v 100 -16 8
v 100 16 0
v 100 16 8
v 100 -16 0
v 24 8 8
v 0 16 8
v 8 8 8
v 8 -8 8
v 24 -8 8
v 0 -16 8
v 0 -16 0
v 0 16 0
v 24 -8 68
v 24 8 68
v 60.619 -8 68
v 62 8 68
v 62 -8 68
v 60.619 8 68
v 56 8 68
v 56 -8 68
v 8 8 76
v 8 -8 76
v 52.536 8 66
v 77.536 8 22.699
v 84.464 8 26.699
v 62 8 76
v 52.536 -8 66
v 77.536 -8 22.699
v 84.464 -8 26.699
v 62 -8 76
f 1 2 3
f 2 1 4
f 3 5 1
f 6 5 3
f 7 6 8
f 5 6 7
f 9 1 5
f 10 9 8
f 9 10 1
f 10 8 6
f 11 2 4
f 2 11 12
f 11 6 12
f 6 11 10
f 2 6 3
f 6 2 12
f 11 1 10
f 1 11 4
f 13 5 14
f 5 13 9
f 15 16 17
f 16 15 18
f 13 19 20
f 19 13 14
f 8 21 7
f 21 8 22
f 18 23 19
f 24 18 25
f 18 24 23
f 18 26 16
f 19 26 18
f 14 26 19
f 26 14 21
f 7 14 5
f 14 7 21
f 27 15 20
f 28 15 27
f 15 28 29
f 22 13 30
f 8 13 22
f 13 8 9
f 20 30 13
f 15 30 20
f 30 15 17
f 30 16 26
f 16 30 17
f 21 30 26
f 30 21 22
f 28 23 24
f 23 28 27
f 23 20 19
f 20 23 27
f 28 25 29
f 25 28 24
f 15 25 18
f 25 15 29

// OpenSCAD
// One hinge, one arm, and nothing driving it.
//
// Every other mechanism here is told what to do by a drive. This one is told
// nothing at all: it is drawn 30° off vertical and let go. What it does after
// that is not a declaration, an animation curve or a tuned number — it is the
// only thing a hinge, a mass and gravity permit.
//
// Which makes it the one model whose answer can be written down in advance. A
// body swinging on a hinge is a compound pendulum, and its period is
//
//     T = 2π · √( I / (m·g·d) ) · (1 + θ₀²/16 + …)
//
// where `d` is how far the centre of mass sits from the hinge line and `I` is
// the moment of inertia about that line — for this arm, a 50 × 8 bar hung by one
// end, `m(L² + w²)/12 + m·d²`. That comes to 0.374 s, and nothing in this file
// says so. The tour's test measures the swing and checks it.
//
// The arm is hung from a bracket that overhangs the post, because a pendulum
// pivoted on the face of its own column swings straight into it. Nothing here
// would complain — the arm is mated to the frame, and two parts a mate joins do
// not collide — which is exactly why it is worth drawing properly.

module part(name, fixed = false, density = undef, mass = undef,
            collider = undef, friction = undef, bounce = undef) { children(); }
module hinge(name, parts, at, axis, range) { }

STEEL = 0.0078;         // g/mm³
PIN   = [0, 1, 0];      // the arm swings in the xz plane

L     = 50;             // arm length, hinge to tip
W     = 8;              // and its thickness in the swing plane
START = 30;             // where it is let go

PIVOT = [56, 0, 68];

part("frame", fixed = true)
    color("slategray") {
        translate([0, -16, 0]) cube([100, 32, 8]);
        translate([8, -8, 8]) cube([16, 16, 60]);          // the post
        translate([8, -8, 68]) cube([54, 16, 8]);          // and its bracket
    }

// Drawn where it is released. A model's drawn pose *is* its initial condition,
// so tilting it here is the whole of "and then let go".
part("arm", density = STEEL, friction = 0.2, bounce = 0)
    color("indianred")
        translate(PIVOT) rotate([0, -START, 0])
            translate([-W / 2, -8, -L]) cube([W, 16, L]);

hinge("swing", parts = ["arm", "frame"], at = PIVOT, axis = PIN);
